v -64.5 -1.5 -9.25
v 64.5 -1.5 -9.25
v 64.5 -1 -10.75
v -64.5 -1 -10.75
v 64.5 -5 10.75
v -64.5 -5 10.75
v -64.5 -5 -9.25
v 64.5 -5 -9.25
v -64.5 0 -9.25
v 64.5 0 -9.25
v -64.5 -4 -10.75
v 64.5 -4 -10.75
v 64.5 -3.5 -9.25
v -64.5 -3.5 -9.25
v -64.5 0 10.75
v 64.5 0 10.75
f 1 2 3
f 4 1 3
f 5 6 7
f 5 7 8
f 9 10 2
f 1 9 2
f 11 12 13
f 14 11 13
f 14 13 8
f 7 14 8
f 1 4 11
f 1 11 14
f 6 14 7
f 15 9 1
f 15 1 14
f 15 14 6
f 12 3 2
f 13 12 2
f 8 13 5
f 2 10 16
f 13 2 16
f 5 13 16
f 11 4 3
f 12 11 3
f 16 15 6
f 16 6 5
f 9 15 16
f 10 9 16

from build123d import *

# Parameters (mm, degrees)
F0_W     = 129
F0_H     = 21.5
F1_DEPTH = 5
F3_DEPTH = 129.001


with BuildPart() as f1:
    # F0 (on Front) → F1 (new body)
    with BuildSketch(Plane.XZ):
        Rectangle(F0_W, F0_H)
    extrude(amount=F1_DEPTH)

    # F2 (on face) → F3 (cut, through all)
    with BuildSketch(Plane.YZ.offset(64.5)):
        Polygon((-4, -10.75), (-3.5, -9.25), (-5, -9.25), (-5, -10.75), align=None)
        Polygon((-1.5, -9.25), (-1, -10.75), (0, -10.75), (0, -9.25), align=None)
    extrude(amount=-F3_DEPTH, mode=Mode.SUBTRACT)


solid = f1.part
